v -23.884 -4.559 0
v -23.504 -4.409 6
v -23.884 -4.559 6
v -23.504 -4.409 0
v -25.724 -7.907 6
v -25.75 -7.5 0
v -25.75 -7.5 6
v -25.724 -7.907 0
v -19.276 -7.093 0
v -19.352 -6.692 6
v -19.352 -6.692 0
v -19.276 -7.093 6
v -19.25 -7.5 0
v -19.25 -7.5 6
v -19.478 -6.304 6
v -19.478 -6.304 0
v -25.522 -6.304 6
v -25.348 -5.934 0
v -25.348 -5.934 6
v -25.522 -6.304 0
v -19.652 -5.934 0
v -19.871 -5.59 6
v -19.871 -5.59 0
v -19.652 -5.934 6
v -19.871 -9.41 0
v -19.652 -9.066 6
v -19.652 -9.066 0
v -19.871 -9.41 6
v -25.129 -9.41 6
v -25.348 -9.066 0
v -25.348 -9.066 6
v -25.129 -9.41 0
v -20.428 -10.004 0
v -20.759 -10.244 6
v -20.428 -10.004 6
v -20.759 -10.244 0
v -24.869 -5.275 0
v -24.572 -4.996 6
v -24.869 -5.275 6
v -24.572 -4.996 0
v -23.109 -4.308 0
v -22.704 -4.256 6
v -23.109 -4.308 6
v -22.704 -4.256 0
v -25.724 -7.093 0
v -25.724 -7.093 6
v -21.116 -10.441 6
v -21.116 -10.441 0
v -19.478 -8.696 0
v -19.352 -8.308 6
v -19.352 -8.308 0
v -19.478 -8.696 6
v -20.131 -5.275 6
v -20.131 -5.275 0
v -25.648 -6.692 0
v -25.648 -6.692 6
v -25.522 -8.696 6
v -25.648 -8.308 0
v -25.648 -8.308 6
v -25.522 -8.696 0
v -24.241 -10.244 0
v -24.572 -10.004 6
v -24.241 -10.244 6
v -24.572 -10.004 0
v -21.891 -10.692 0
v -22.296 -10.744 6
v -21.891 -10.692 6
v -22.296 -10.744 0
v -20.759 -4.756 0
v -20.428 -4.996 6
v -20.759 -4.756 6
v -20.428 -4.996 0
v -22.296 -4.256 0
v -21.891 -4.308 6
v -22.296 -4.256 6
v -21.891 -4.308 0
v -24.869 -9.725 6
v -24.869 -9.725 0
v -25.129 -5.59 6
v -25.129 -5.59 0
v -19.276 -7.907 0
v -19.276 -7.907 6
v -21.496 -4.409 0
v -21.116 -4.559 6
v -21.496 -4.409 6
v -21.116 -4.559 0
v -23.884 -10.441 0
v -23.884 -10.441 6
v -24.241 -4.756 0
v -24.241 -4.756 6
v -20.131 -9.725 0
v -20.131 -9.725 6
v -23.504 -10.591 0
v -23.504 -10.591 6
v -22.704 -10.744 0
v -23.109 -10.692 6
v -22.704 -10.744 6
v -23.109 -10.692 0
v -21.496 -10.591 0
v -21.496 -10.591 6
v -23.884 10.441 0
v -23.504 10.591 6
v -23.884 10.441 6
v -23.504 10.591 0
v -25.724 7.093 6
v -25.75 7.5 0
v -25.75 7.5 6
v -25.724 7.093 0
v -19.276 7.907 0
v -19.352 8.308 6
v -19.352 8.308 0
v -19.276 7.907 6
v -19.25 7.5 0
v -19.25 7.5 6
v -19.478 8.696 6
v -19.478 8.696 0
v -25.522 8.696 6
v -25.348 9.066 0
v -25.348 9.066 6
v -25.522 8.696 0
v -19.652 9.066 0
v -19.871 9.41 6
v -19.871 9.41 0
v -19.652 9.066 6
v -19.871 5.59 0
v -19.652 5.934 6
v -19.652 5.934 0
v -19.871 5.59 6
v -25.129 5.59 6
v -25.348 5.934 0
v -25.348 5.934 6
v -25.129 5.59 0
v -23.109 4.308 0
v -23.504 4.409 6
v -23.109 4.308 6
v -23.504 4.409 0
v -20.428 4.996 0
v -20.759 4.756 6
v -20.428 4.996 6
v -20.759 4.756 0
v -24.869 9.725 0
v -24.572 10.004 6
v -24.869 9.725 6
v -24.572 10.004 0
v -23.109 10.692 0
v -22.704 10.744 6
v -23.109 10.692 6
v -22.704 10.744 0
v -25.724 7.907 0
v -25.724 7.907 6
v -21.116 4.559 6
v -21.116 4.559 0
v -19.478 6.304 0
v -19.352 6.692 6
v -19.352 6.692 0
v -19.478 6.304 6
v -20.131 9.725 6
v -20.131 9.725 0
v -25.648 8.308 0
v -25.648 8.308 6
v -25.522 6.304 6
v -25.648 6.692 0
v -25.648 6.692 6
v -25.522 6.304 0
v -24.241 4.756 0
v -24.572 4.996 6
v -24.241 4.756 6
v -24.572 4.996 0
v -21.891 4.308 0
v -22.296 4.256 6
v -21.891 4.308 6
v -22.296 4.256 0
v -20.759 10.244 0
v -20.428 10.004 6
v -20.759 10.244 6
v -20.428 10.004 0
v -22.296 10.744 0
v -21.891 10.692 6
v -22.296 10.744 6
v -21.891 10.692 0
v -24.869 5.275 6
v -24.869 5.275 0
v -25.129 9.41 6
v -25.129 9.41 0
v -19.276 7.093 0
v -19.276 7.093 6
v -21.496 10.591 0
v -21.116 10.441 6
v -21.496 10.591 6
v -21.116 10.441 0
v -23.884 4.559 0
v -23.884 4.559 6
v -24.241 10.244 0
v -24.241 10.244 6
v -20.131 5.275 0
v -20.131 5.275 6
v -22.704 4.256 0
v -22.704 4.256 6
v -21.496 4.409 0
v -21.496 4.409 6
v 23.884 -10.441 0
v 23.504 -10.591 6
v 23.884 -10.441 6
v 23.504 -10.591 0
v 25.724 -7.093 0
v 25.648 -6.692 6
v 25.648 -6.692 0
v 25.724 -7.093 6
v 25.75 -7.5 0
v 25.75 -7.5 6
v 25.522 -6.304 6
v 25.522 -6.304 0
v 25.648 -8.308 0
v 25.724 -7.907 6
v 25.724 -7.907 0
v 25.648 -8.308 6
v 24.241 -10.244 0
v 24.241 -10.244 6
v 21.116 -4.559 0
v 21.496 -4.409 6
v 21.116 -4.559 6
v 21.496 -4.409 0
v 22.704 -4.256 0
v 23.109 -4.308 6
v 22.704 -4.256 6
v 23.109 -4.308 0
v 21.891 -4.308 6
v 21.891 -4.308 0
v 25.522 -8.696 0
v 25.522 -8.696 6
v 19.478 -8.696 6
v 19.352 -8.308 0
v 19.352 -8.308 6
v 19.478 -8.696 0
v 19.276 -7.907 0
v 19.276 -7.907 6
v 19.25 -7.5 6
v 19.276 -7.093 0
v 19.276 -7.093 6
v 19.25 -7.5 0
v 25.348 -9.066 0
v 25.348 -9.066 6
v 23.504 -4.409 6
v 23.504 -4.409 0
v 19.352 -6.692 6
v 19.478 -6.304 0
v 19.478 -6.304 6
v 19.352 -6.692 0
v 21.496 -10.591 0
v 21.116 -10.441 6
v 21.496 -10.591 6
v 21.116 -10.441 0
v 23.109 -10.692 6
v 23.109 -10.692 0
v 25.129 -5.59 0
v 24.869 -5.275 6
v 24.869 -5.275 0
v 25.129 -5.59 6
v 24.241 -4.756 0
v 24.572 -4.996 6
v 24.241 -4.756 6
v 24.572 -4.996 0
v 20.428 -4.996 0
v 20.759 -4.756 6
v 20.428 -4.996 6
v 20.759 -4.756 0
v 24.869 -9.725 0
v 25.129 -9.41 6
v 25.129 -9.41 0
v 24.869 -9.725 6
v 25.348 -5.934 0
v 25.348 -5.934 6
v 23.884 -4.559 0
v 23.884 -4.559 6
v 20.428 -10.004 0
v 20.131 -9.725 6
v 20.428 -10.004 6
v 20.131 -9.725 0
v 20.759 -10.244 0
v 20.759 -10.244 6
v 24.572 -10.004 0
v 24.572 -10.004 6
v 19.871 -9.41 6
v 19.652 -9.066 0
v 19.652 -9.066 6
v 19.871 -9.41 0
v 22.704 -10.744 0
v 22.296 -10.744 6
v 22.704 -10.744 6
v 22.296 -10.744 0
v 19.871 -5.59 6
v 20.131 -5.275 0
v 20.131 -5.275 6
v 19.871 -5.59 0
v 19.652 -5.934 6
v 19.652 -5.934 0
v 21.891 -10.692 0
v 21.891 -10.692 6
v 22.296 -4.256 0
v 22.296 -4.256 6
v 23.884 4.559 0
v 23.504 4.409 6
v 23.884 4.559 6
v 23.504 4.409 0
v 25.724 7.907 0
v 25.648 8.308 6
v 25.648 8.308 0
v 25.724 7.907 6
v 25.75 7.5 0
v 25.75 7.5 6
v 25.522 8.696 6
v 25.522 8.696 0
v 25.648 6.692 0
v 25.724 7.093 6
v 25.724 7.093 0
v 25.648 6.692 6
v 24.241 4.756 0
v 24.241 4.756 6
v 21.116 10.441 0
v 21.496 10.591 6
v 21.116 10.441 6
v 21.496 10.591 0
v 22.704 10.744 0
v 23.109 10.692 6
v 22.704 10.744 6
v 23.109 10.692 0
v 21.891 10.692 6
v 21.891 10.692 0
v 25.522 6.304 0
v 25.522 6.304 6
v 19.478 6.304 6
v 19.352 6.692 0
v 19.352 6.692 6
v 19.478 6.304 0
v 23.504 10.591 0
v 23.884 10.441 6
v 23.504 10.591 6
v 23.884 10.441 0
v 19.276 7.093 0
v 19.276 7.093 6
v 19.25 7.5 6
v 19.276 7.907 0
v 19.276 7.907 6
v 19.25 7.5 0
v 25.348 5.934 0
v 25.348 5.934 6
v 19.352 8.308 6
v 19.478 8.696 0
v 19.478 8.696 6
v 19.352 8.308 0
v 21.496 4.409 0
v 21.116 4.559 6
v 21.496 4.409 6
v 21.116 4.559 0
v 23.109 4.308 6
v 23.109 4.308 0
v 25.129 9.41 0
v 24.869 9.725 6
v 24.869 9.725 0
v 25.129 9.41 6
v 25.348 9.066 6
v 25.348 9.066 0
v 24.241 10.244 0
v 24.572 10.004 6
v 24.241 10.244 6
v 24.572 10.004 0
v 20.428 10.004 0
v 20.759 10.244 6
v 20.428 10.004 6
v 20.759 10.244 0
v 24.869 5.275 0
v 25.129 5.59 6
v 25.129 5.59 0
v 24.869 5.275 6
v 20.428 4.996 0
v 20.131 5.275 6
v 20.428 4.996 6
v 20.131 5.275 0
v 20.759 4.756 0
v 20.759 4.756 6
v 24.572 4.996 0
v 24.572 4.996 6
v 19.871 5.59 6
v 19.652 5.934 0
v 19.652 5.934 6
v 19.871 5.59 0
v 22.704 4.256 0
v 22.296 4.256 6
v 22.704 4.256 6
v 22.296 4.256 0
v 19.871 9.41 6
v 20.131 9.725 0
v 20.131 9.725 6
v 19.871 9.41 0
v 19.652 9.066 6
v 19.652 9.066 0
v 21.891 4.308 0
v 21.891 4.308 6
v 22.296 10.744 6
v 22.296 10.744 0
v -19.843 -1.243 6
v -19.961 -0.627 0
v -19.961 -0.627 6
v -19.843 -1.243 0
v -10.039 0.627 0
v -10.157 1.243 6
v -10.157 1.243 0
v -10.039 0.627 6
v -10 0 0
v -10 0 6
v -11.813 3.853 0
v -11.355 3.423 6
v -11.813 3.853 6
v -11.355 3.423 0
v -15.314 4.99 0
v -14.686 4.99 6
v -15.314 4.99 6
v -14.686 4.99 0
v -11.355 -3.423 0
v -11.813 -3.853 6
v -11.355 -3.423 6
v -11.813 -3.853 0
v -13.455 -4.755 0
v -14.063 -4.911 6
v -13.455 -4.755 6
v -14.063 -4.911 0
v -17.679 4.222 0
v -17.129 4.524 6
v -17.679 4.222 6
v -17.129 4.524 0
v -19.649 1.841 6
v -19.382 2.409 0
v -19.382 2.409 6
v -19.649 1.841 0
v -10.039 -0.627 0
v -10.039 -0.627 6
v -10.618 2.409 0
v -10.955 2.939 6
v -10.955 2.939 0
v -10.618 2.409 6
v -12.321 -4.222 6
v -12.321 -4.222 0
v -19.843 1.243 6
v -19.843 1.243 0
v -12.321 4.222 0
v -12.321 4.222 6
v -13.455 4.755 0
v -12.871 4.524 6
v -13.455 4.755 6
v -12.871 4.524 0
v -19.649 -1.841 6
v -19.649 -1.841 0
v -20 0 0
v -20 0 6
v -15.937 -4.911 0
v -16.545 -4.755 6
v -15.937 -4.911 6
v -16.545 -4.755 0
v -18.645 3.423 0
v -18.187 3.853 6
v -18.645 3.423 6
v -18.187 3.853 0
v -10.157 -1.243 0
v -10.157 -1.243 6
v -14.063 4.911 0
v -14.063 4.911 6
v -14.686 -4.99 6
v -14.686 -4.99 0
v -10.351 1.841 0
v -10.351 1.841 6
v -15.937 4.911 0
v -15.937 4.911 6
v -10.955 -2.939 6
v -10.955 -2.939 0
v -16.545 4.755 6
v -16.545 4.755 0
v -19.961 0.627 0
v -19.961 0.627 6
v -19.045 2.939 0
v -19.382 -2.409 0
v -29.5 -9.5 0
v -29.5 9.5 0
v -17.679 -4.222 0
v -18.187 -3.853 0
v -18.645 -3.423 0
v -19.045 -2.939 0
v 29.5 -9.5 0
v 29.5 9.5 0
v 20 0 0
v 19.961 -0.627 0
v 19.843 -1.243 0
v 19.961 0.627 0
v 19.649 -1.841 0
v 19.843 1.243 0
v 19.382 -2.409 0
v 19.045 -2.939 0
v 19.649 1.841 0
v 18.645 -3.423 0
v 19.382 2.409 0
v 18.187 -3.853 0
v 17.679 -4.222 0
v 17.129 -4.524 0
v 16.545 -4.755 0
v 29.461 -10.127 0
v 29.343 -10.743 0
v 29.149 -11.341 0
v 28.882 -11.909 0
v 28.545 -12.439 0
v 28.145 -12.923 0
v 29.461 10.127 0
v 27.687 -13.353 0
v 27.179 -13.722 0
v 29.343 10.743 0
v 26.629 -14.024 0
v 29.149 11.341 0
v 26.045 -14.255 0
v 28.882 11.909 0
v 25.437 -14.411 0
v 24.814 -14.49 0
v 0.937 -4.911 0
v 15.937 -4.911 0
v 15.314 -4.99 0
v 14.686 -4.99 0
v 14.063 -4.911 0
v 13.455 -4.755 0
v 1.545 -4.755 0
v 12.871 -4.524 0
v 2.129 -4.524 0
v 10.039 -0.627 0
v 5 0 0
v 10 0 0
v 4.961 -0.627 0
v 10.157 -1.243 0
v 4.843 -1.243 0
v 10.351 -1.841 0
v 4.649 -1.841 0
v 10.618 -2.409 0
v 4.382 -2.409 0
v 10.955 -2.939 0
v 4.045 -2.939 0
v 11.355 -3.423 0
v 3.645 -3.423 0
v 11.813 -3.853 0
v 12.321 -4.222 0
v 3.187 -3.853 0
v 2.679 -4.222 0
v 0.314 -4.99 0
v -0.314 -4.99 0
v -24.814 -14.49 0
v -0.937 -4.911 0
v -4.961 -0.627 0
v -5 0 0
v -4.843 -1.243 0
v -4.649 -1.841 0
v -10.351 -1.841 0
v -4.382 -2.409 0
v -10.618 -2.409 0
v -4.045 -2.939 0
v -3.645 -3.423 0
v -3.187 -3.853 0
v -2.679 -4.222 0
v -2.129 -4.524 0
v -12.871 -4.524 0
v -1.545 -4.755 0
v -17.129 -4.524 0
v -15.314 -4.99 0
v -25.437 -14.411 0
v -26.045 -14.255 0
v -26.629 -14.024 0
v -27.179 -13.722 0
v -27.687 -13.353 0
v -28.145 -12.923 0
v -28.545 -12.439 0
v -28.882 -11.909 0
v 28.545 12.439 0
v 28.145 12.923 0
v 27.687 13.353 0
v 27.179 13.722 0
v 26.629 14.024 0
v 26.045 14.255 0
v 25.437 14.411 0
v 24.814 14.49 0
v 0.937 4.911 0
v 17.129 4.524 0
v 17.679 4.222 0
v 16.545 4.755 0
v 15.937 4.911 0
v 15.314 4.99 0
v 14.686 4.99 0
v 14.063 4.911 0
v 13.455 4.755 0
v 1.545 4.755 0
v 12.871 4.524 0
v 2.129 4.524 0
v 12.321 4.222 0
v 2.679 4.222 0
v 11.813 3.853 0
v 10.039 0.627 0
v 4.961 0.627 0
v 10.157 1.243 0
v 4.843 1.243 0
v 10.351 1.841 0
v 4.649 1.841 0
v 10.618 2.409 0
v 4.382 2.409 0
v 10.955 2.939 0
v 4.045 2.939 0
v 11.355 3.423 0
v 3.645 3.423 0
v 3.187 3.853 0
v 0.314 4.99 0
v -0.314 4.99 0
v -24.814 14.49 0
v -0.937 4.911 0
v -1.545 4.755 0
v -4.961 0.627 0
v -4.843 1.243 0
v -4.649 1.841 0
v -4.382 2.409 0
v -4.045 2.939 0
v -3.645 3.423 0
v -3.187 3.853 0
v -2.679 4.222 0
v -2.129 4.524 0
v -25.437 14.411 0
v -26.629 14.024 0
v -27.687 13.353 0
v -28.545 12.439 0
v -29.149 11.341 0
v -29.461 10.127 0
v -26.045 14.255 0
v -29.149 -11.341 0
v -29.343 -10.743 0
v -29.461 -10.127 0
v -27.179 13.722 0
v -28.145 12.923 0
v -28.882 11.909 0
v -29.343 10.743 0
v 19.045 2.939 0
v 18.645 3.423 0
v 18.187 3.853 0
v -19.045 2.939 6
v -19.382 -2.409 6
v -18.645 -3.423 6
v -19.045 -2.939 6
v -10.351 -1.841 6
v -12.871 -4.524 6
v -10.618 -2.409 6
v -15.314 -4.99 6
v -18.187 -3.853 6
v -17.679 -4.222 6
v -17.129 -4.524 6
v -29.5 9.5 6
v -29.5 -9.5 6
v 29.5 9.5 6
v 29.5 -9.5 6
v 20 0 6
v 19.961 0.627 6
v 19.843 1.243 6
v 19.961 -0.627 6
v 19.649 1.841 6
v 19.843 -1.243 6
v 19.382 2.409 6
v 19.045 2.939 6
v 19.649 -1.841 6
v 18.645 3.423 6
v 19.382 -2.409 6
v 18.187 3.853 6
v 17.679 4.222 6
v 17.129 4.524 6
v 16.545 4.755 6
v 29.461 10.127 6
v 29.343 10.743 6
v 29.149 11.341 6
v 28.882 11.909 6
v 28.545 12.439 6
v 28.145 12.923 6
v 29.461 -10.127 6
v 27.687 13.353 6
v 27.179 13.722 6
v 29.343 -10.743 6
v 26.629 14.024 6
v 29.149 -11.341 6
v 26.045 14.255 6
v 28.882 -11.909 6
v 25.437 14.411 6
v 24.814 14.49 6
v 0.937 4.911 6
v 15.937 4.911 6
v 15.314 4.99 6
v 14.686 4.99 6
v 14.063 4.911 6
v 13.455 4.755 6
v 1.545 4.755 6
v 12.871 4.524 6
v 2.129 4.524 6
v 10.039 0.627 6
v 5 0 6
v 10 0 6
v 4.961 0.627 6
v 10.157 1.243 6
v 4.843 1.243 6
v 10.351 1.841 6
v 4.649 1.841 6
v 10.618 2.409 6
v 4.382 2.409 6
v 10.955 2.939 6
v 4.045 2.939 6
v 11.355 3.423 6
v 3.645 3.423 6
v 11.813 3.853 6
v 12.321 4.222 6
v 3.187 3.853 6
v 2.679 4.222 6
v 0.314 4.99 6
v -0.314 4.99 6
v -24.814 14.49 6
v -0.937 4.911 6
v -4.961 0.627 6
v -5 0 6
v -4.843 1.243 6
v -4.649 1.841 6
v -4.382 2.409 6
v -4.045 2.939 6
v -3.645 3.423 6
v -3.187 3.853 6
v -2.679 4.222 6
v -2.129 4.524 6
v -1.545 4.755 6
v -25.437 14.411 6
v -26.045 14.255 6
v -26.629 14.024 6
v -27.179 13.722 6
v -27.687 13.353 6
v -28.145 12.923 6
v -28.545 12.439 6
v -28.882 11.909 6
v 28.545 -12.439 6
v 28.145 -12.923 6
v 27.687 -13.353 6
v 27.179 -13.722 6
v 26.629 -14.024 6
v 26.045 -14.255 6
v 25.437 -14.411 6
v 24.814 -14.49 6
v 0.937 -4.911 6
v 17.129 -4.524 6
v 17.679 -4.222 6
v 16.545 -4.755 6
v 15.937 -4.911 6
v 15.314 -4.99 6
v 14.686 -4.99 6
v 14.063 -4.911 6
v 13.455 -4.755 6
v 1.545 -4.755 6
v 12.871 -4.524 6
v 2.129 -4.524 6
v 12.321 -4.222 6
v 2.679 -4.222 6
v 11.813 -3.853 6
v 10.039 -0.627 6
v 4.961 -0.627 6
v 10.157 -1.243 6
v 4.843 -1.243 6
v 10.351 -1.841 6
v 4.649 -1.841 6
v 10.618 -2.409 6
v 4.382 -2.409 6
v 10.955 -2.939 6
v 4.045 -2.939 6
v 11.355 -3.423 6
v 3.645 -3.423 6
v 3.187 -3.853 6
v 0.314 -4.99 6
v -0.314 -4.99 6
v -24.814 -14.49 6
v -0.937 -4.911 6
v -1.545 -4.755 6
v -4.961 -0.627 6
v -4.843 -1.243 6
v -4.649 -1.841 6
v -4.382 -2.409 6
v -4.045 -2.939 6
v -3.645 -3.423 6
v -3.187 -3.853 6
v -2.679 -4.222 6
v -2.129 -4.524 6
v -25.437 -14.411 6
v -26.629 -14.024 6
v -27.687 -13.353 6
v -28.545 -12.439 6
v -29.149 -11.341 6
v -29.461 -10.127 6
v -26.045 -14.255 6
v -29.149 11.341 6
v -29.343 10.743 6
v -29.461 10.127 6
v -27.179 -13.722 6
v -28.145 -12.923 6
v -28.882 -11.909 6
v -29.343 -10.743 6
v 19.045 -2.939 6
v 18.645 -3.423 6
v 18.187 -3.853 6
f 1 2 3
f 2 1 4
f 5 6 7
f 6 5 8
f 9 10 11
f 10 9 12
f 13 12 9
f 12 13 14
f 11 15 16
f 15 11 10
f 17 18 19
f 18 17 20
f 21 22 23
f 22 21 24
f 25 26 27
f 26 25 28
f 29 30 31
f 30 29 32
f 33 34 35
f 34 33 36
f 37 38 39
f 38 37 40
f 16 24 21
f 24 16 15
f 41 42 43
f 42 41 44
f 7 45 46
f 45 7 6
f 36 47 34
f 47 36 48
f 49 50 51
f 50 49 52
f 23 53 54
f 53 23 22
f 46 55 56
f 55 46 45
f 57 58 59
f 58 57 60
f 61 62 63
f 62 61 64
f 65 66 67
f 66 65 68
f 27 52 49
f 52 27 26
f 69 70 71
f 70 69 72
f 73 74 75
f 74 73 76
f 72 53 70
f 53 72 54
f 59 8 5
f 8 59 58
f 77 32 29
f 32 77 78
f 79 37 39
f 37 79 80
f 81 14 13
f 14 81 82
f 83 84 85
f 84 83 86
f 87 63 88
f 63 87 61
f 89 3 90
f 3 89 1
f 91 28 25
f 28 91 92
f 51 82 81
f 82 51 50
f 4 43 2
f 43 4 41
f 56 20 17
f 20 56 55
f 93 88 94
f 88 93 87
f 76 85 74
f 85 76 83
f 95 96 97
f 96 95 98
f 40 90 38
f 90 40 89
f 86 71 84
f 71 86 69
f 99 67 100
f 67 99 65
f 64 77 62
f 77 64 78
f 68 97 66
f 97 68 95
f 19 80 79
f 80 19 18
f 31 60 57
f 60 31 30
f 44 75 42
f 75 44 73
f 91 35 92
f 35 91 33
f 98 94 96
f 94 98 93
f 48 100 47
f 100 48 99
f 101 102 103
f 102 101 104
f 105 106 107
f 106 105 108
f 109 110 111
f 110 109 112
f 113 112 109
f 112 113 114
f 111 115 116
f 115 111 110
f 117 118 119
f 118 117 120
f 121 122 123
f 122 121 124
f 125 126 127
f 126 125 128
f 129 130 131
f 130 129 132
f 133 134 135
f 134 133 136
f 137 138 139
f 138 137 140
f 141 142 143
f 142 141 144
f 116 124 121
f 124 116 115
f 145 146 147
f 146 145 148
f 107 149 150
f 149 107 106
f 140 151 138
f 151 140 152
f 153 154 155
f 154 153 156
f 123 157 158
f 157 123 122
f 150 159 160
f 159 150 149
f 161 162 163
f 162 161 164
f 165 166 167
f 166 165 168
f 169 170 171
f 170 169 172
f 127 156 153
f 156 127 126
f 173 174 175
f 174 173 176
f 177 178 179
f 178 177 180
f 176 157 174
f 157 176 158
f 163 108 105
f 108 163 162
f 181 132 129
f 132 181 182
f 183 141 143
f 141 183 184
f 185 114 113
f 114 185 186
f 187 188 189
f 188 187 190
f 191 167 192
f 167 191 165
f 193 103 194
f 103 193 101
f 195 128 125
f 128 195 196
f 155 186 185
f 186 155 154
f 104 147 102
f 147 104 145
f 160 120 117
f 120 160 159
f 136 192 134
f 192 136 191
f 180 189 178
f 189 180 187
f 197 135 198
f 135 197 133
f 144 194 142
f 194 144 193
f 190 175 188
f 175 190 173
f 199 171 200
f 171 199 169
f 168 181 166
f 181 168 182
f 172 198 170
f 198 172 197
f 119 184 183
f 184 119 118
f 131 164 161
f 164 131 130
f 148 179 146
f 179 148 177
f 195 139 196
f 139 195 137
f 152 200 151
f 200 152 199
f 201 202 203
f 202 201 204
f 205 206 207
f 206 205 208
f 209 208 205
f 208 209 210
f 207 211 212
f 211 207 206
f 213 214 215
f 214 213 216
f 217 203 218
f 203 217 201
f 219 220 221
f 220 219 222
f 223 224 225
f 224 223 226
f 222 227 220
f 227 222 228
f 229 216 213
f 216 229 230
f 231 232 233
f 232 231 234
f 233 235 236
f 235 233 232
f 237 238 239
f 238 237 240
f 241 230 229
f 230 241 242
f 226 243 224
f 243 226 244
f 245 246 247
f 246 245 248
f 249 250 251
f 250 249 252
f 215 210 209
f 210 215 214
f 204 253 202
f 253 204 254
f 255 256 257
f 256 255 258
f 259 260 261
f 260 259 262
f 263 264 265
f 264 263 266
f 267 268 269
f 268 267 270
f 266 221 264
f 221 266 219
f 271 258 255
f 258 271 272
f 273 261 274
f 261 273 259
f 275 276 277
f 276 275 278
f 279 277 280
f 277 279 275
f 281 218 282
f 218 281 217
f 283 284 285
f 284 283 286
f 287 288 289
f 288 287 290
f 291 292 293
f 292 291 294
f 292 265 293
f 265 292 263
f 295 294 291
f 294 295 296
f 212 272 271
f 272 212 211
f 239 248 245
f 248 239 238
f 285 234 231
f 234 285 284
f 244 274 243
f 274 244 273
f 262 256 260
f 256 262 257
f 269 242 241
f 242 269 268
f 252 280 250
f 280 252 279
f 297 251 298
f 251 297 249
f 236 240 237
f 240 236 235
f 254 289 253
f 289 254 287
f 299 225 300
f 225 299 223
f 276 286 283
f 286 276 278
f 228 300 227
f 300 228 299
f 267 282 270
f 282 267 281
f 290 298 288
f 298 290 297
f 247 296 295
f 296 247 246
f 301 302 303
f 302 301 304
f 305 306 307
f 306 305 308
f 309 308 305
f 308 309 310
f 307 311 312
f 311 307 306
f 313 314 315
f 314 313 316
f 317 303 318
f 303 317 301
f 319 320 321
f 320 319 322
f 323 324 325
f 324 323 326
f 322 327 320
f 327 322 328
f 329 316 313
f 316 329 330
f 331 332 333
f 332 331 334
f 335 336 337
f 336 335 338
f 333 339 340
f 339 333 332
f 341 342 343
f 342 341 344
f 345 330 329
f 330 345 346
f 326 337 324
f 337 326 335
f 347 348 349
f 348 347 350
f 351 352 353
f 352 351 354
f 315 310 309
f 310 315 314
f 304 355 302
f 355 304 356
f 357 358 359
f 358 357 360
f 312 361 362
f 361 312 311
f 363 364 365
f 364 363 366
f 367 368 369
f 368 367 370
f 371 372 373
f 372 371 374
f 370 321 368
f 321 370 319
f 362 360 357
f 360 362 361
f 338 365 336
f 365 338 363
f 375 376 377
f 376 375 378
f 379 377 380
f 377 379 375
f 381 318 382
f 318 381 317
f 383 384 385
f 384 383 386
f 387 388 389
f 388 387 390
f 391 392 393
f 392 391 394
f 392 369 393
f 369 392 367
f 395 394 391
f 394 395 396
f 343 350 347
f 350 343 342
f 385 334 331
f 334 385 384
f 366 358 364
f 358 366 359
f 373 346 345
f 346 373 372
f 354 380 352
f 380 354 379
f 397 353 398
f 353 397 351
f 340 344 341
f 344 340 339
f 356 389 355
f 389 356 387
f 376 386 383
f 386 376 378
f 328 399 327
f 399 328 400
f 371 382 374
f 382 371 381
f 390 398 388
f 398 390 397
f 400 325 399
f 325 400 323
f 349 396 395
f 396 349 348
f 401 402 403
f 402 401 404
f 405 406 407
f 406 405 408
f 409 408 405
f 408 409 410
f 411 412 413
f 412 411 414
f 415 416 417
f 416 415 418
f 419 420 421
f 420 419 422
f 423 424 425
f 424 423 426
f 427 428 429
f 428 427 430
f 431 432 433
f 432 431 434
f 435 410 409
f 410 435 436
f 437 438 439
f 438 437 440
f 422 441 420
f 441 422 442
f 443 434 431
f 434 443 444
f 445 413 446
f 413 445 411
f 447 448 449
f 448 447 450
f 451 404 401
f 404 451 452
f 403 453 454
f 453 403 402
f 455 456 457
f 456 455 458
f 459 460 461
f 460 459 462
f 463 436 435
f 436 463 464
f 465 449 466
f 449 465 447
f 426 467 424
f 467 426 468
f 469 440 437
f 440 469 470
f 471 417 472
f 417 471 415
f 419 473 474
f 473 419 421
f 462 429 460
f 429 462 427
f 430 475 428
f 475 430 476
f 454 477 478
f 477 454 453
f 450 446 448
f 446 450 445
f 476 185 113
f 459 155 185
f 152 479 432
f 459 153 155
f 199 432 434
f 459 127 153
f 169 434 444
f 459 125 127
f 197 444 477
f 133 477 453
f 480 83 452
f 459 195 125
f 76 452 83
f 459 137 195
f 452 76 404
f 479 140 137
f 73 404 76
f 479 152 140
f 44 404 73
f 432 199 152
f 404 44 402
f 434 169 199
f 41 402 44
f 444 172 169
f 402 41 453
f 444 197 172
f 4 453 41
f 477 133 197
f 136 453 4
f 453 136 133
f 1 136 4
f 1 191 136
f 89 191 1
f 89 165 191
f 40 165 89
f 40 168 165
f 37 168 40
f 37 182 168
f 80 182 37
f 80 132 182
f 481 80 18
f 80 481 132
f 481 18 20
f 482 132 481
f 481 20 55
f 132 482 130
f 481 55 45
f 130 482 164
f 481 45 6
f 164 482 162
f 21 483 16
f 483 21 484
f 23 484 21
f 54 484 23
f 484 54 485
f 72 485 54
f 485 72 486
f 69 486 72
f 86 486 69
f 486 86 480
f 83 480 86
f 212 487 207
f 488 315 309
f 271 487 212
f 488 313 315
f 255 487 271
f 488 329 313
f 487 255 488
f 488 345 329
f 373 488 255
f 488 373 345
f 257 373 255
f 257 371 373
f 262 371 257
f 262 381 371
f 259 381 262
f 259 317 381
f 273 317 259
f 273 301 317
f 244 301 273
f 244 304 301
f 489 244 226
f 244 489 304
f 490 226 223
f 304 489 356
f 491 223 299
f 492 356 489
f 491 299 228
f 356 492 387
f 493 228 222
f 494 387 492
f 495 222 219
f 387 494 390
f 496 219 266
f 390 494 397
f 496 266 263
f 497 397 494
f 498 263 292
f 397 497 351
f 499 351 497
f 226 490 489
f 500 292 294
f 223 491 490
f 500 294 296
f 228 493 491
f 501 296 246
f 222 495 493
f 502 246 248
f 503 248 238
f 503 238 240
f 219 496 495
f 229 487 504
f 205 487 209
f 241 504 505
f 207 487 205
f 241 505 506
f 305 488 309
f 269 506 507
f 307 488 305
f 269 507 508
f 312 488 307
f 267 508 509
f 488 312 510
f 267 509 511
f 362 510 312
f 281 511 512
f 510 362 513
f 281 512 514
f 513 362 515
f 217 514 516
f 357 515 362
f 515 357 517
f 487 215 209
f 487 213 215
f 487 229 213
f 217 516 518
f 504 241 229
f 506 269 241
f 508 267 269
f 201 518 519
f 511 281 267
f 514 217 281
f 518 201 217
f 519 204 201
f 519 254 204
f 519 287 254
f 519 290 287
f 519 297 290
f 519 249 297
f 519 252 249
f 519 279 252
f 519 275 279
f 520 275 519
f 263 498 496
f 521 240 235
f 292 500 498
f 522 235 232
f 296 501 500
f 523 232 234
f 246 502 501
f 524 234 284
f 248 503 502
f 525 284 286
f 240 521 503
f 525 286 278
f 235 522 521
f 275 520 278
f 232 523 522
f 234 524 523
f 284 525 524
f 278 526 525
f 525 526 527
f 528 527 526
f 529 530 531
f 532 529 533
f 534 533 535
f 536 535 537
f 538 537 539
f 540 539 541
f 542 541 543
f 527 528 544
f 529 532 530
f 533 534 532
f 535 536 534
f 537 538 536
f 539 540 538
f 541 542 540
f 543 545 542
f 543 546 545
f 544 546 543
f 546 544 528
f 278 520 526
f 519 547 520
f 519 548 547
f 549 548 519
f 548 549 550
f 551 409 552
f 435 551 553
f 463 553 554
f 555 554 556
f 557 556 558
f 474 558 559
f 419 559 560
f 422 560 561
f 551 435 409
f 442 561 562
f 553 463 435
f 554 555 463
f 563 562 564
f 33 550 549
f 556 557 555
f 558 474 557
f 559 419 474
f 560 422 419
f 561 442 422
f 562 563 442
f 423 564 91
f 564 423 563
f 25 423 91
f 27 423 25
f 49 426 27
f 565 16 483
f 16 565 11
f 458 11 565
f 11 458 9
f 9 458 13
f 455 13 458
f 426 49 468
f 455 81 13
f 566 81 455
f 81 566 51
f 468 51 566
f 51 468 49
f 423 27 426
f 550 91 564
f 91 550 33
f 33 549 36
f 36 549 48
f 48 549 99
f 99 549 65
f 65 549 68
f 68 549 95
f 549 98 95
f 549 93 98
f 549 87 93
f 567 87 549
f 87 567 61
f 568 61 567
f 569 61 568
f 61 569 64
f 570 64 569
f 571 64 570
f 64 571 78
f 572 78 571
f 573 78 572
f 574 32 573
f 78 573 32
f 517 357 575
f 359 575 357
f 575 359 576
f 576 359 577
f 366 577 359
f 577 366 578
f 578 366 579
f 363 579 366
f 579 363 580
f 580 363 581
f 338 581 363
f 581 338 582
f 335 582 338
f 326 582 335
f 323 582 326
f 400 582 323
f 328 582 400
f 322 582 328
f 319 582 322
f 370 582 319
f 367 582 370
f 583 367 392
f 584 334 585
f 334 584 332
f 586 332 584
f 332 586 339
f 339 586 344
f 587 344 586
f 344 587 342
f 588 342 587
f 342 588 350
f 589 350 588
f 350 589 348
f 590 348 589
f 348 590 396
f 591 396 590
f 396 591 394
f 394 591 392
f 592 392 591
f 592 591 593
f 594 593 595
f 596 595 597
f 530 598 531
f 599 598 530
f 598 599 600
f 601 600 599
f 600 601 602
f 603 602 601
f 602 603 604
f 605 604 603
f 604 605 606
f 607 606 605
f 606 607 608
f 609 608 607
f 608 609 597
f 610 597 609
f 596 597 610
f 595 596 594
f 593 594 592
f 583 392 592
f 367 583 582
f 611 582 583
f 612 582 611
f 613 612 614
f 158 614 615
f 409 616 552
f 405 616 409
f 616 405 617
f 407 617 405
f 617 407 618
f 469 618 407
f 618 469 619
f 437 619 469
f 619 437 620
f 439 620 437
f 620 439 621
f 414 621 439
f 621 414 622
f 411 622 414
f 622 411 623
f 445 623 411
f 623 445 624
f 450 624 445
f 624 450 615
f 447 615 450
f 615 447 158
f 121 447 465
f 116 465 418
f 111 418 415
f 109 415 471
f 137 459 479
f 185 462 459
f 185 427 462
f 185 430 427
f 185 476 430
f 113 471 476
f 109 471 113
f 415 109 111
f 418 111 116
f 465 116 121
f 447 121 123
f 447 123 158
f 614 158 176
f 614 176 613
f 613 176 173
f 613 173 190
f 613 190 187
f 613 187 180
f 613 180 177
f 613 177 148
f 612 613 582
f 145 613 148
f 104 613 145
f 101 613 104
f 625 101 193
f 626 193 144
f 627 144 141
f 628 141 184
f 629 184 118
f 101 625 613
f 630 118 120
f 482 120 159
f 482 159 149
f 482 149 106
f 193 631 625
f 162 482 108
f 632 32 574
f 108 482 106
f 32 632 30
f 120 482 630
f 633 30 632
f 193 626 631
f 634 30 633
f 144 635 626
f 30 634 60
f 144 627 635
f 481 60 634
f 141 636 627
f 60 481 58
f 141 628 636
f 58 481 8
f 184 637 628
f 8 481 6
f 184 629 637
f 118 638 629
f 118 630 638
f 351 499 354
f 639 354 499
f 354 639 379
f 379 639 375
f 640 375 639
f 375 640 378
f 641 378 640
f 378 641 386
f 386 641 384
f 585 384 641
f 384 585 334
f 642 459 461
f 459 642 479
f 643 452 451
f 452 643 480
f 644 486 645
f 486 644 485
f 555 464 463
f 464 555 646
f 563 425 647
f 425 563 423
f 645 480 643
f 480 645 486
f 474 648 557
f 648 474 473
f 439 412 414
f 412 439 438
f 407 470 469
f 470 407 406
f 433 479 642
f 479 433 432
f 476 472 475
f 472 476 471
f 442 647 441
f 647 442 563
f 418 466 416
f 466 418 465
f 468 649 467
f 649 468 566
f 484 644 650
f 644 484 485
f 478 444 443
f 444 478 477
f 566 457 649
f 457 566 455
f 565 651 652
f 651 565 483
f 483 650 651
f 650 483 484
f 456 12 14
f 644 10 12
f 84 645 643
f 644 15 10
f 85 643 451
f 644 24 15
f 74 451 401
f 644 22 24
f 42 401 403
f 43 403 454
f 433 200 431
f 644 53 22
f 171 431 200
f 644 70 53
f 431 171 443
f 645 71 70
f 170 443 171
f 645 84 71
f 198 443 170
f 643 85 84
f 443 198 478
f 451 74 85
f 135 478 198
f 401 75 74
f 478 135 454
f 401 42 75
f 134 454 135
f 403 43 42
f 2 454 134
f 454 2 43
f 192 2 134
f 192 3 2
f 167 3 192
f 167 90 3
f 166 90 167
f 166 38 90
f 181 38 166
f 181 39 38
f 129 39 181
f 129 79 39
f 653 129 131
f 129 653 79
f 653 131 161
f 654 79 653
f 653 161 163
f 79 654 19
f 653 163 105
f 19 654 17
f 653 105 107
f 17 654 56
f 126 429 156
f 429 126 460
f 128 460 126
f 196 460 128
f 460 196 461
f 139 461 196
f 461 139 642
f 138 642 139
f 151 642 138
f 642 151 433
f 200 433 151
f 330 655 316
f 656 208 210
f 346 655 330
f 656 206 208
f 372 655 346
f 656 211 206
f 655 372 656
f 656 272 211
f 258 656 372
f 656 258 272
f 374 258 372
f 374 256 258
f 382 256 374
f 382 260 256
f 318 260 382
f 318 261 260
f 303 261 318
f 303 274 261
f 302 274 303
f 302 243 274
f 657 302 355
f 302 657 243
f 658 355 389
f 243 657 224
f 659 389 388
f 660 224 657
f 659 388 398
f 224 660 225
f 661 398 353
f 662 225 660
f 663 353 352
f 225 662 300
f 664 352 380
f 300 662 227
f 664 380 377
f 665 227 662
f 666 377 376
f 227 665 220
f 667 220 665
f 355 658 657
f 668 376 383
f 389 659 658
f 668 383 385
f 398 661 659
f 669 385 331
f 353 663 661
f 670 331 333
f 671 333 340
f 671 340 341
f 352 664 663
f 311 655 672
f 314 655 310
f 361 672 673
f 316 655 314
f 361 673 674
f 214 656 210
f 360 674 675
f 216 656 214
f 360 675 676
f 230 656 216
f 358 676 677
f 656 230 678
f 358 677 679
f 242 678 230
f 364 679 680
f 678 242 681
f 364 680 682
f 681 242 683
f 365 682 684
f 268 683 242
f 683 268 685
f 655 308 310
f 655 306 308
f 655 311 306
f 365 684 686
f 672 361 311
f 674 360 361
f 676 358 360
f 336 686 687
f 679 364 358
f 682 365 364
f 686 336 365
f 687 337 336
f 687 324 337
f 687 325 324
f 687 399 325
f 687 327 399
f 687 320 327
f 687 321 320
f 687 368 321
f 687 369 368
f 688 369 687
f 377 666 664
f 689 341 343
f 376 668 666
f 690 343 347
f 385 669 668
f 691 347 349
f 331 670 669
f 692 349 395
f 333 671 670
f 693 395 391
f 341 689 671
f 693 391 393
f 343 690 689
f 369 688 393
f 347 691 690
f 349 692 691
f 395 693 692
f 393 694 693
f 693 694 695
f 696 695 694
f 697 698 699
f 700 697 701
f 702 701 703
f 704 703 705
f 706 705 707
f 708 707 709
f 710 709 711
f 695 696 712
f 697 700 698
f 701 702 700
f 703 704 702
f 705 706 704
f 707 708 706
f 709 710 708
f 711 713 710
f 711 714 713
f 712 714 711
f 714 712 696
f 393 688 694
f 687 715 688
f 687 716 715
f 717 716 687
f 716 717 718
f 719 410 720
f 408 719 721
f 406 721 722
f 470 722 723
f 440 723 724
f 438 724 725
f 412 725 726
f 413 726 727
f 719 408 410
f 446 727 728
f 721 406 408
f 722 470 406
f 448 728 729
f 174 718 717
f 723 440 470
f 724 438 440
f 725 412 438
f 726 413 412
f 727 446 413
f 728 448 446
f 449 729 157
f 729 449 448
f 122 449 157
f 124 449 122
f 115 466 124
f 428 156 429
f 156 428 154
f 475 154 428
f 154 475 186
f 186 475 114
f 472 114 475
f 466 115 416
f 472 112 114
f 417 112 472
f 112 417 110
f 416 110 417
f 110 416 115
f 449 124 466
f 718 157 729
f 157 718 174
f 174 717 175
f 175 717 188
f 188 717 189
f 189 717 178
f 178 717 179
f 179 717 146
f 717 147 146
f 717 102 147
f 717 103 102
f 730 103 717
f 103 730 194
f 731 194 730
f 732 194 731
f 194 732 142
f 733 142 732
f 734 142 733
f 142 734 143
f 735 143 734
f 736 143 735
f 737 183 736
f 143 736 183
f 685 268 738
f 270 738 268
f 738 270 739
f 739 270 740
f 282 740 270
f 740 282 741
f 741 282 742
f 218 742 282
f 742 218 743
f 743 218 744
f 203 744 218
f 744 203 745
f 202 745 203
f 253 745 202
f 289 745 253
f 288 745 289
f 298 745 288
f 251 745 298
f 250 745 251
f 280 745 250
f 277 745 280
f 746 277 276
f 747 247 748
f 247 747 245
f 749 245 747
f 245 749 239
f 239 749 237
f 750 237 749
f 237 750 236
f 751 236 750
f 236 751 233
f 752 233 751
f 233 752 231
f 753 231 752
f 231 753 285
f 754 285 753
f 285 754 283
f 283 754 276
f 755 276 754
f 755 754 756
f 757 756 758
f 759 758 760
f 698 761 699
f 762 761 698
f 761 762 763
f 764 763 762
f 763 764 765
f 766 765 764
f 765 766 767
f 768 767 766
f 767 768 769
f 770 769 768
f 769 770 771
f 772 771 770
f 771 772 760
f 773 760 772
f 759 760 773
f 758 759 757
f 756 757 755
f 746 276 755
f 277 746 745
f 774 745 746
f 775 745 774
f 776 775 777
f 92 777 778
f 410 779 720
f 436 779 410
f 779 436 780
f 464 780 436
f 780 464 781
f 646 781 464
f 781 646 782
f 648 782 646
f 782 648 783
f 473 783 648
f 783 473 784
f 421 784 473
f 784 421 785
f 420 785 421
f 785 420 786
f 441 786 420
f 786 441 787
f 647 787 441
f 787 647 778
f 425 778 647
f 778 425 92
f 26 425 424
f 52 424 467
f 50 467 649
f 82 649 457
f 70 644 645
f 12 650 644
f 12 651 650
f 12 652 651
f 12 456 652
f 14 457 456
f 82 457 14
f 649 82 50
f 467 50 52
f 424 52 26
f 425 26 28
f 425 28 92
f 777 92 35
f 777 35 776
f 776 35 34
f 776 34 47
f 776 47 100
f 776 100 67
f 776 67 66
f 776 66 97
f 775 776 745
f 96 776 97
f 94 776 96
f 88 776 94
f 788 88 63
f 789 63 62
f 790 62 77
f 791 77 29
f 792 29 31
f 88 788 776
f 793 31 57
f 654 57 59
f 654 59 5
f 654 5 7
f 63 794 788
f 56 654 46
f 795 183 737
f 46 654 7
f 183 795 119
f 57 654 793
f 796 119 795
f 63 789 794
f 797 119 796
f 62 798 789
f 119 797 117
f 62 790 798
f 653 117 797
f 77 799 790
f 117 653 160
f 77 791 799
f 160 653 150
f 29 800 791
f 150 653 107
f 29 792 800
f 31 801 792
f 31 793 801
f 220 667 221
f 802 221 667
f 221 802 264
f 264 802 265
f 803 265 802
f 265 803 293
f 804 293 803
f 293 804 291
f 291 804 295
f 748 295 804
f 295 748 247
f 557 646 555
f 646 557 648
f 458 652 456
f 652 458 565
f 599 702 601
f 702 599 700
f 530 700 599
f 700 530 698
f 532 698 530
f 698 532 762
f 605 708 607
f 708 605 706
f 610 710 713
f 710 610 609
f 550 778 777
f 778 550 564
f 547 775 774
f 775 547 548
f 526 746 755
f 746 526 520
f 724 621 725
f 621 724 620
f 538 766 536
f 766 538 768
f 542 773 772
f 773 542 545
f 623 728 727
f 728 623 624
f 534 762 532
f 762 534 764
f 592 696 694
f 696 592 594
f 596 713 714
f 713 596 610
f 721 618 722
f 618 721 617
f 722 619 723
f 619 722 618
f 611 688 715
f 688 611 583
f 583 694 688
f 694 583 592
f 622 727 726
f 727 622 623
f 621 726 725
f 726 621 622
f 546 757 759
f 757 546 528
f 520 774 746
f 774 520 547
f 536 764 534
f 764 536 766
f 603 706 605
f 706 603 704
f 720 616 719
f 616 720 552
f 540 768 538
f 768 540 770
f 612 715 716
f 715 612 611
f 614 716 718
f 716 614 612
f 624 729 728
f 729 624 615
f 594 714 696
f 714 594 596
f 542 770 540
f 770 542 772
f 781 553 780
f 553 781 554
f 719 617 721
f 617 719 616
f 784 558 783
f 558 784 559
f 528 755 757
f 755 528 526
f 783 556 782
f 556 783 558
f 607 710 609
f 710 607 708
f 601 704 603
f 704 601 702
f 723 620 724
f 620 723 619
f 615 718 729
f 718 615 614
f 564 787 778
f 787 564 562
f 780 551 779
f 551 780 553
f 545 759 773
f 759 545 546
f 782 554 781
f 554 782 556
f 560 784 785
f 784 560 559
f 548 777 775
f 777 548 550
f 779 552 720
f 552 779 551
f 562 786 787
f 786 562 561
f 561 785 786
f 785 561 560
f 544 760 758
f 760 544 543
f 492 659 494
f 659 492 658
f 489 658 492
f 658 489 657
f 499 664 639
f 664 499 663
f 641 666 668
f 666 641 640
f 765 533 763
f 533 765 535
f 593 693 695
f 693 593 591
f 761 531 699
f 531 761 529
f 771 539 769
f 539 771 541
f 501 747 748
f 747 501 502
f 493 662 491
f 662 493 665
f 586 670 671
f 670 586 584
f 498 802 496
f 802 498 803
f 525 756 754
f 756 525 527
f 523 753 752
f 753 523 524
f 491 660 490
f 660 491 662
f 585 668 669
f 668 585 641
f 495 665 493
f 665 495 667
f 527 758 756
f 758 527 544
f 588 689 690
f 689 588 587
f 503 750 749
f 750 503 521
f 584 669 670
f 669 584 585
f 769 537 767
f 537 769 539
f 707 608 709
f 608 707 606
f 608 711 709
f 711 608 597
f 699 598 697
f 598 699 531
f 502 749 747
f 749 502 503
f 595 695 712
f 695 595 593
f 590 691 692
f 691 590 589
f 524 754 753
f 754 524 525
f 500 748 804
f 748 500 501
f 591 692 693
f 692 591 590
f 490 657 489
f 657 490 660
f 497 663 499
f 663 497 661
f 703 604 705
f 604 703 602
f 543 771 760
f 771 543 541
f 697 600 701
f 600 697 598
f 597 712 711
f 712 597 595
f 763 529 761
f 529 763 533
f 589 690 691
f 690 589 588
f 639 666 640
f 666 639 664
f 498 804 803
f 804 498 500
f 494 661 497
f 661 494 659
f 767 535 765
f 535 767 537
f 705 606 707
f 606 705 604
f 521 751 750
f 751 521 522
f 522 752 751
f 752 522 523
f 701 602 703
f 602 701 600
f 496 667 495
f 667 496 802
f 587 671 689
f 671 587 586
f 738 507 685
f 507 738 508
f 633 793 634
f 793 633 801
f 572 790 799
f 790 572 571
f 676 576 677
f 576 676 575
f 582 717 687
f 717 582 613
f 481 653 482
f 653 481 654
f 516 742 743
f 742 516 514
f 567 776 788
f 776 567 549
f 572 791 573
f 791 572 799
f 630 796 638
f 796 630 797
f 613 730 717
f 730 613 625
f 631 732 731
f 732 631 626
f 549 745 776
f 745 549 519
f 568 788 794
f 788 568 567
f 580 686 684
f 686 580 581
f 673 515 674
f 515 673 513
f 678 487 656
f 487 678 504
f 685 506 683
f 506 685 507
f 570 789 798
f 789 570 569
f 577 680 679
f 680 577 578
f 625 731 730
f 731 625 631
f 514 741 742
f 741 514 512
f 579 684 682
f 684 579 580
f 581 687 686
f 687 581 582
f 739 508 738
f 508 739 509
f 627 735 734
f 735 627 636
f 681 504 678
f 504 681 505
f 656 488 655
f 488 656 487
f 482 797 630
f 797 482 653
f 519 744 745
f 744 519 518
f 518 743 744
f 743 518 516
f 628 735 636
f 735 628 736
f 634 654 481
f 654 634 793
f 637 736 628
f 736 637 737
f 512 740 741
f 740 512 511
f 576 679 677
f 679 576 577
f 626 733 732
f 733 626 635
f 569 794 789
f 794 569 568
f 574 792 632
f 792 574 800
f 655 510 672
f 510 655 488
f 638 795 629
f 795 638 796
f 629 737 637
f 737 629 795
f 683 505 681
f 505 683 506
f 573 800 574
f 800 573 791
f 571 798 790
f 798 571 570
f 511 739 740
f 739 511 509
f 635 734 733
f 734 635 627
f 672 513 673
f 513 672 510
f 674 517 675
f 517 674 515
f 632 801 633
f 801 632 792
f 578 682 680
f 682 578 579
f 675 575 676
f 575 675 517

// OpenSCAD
$fn = 50;


difference() {
	union() {
		hull() {
			translate(v = [-24.5000000000, 9.5000000000, 0]) {
				cylinder(h = 6, r = 5);
			}
			translate(v = [24.5000000000, 9.5000000000, 0]) {
				cylinder(h = 6, r = 5);
			}
			translate(v = [-24.5000000000, -9.5000000000, 0]) {
				cylinder(h = 6, r = 5);
			}
			translate(v = [24.5000000000, -9.5000000000, 0]) {
				cylinder(h = 6, r = 5);
			}
		}
	}
	union() {
		#translate(v = [-22.5000000000, -7.5000000000, -100.0000000000]) {
			cylinder(h = 200, r = 3.2500000000);
		}
		#translate(v = [-22.5000000000, 7.5000000000, -100.0000000000]) {
			cylinder(h = 200, r = 3.2500000000);
		}
		#translate(v = [22.5000000000, -7.5000000000, -100.0000000000]) {
			cylinder(h = 200, r = 3.2500000000);
		}
		#translate(v = [22.5000000000, 7.5000000000, -100.0000000000]) {
			cylinder(h = 200, r = 3.2500000000);
		}
		#translate(v = [-15.0000000000, 0, 0]) {
			cylinder(h = 6, r = 5.0000000000);
		}
		#cylinder(h = 6, r = 5.0000000000);
		#translate(v = [15.0000000000, 0, 0]) {
			cylinder(h = 6, r = 5.0000000000);
		}
	}
}
